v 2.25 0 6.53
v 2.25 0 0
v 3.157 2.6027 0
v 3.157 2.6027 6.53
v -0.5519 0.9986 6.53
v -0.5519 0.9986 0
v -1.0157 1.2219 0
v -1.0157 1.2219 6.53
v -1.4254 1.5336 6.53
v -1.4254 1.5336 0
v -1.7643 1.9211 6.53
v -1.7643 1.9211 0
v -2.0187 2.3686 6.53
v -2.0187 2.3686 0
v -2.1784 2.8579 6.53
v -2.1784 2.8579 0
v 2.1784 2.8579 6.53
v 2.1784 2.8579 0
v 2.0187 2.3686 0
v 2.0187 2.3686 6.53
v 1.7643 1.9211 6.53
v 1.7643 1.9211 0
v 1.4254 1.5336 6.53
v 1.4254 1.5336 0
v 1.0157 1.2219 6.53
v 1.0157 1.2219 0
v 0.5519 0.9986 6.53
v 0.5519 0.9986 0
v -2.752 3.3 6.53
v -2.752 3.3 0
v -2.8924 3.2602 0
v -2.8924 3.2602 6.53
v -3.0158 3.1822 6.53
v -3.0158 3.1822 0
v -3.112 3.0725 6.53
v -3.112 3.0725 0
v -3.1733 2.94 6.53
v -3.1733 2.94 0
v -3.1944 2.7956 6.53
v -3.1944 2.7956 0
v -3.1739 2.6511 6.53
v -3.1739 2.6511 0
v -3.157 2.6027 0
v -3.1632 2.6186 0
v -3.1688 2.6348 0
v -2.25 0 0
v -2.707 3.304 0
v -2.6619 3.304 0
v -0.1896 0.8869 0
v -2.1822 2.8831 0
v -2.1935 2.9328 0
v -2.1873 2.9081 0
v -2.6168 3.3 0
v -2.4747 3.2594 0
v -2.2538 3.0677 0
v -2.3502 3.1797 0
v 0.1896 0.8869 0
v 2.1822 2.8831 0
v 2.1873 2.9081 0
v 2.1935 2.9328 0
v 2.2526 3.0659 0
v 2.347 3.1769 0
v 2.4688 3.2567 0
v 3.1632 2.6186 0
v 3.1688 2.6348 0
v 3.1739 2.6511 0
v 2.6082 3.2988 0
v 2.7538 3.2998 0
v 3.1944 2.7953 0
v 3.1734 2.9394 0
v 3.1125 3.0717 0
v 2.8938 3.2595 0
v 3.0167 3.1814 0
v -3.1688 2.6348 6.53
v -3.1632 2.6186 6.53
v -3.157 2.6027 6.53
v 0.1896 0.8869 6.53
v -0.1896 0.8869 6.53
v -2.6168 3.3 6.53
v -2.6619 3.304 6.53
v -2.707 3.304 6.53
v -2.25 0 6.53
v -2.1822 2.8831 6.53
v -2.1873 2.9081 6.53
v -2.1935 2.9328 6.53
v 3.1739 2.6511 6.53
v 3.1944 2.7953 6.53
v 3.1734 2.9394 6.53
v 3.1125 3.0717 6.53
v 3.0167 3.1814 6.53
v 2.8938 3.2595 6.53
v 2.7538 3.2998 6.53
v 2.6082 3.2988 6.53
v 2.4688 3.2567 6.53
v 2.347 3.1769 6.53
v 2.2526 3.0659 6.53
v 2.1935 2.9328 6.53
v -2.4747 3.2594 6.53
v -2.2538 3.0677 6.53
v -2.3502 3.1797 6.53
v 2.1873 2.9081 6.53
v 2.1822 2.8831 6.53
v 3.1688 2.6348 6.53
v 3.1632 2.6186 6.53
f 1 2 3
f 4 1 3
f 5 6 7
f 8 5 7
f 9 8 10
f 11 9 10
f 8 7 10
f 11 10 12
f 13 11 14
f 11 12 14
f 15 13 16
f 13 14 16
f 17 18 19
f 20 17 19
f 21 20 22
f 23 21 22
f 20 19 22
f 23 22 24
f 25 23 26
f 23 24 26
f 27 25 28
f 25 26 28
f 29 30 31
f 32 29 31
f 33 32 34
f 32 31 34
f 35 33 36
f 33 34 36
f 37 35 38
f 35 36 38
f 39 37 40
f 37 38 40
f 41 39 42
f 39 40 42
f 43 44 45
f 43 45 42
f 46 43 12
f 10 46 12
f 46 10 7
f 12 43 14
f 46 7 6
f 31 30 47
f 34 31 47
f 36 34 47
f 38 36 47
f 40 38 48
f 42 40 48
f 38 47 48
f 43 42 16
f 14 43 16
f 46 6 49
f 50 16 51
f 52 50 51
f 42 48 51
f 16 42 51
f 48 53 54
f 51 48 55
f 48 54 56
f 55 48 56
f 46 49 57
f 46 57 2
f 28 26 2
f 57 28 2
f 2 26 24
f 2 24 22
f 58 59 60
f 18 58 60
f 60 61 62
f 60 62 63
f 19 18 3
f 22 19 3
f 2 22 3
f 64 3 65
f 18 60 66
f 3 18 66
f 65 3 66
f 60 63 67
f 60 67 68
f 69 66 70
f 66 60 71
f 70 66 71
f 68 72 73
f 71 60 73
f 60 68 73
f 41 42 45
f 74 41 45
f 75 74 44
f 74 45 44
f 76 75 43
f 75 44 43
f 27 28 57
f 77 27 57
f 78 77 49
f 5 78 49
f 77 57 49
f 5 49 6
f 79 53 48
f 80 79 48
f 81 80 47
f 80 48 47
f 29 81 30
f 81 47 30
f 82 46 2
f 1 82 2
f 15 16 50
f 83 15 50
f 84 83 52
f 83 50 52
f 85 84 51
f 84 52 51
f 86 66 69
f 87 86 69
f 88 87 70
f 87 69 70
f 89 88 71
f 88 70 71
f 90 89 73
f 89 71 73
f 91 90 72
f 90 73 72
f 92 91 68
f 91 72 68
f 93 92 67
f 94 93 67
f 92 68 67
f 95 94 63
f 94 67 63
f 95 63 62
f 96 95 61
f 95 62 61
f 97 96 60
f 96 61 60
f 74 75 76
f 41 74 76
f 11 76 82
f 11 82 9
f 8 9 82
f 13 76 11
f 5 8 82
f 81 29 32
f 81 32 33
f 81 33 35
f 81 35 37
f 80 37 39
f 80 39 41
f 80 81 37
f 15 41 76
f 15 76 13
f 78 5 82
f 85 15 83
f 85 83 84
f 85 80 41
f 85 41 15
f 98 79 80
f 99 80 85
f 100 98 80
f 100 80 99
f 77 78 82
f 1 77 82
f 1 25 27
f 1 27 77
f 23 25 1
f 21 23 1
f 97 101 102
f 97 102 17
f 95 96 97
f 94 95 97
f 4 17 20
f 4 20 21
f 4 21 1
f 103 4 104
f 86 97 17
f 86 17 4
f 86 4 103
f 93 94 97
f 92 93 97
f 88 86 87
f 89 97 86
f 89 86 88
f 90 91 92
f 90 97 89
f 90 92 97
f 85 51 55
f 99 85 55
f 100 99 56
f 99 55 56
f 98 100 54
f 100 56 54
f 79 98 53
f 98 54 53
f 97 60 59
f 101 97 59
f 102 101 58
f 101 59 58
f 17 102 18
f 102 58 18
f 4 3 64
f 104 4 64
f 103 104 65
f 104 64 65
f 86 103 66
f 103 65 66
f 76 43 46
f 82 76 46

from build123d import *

# Parameters (mm, degrees)
F1_DEPTH = 6.53


with BuildPart() as f1:
    # F0 (on Top) → F1 (new body)
    with BuildSketch(Plane.XY):
        with BuildLine():
            Line((-2.25, 0), (0, 0))
            Line((0, 0), (2.25, 0))
            Line((2.25, 0), (3.156994, 2.602679))
            Line((3.156994, 2.602679), (3.173864, 2.651089))
            ThreePointArc((3.173864, 2.651089), (2.825283, 3.284668), (2.193543, 2.932764))
            ThreePointArc((2.193543, 2.932764), (2.186252, 2.895291), (2.178403, 2.85793))
            ThreePointArc((2.178403, 2.85793), (1.604596, 1.718806), (0.551908, 0.998591))
            ThreePointArc((0.551908, 0.998591), (0, 0.87272), (-0.551908, 0.998591))
            ThreePointArc((-0.551908, 0.998591), (-1.604596, 1.718806), (-2.178403, 2.85793))
            ThreePointArc((-2.178403, 2.85793), (-2.186252, 2.895291), (-2.193543, 2.932764))
            ThreePointArc((-2.193543, 2.932764), (-2.350233, 3.179732), (-2.616842, 3.3))
            Line((-2.616842, 3.3), (-2.752045, 3.3))
            ThreePointArc((-2.752045, 3.3), (-3.112041, 3.072457), (-3.173864, 2.651089))
            Line((-3.173864, 2.651089), (-3.156994, 2.602679))
            Line((-3.156994, 2.602679), (-2.25, 0))
        make_face()
        with BuildLine():
            ThreePointArc((-3.173864, 2.651089), (-3.166038, 2.626672), (-3.156994, 2.602679))
            Line((-3.156994, 2.602679), (-3.173864, 2.651089))
        make_face()
        with BuildLine():
            Line((3.173864, 2.651089), (3.156994, 2.602679))
            ThreePointArc((3.156994, 2.602679), (3.166038, 2.626672), (3.173864, 2.651089))
        make_face()
        with BuildLine():
            ThreePointArc((-2.616842, 3.3), (-2.684443, 3.3045), (-2.752045, 3.3))
            Line((-2.752045, 3.3), (-2.616842, 3.3))
        make_face()
        with BuildLine():
            ThreePointArc((2.178403, 2.85793), (2.186252, 2.895291), (2.193543, 2.932764))
            ThreePointArc((2.193543, 2.932764), (2.18457, 2.895631), (2.178403, 2.85793))
        make_face()
        with BuildLine():
            ThreePointArc((-2.178403, 2.85793), (-2.18457, 2.895631), (-2.193543, 2.932764))
            ThreePointArc((-2.193543, 2.932764), (-2.186252, 2.895291), (-2.178403, 2.85793))
        make_face()
    extrude(amount=F1_DEPTH)


solid = f1.part
